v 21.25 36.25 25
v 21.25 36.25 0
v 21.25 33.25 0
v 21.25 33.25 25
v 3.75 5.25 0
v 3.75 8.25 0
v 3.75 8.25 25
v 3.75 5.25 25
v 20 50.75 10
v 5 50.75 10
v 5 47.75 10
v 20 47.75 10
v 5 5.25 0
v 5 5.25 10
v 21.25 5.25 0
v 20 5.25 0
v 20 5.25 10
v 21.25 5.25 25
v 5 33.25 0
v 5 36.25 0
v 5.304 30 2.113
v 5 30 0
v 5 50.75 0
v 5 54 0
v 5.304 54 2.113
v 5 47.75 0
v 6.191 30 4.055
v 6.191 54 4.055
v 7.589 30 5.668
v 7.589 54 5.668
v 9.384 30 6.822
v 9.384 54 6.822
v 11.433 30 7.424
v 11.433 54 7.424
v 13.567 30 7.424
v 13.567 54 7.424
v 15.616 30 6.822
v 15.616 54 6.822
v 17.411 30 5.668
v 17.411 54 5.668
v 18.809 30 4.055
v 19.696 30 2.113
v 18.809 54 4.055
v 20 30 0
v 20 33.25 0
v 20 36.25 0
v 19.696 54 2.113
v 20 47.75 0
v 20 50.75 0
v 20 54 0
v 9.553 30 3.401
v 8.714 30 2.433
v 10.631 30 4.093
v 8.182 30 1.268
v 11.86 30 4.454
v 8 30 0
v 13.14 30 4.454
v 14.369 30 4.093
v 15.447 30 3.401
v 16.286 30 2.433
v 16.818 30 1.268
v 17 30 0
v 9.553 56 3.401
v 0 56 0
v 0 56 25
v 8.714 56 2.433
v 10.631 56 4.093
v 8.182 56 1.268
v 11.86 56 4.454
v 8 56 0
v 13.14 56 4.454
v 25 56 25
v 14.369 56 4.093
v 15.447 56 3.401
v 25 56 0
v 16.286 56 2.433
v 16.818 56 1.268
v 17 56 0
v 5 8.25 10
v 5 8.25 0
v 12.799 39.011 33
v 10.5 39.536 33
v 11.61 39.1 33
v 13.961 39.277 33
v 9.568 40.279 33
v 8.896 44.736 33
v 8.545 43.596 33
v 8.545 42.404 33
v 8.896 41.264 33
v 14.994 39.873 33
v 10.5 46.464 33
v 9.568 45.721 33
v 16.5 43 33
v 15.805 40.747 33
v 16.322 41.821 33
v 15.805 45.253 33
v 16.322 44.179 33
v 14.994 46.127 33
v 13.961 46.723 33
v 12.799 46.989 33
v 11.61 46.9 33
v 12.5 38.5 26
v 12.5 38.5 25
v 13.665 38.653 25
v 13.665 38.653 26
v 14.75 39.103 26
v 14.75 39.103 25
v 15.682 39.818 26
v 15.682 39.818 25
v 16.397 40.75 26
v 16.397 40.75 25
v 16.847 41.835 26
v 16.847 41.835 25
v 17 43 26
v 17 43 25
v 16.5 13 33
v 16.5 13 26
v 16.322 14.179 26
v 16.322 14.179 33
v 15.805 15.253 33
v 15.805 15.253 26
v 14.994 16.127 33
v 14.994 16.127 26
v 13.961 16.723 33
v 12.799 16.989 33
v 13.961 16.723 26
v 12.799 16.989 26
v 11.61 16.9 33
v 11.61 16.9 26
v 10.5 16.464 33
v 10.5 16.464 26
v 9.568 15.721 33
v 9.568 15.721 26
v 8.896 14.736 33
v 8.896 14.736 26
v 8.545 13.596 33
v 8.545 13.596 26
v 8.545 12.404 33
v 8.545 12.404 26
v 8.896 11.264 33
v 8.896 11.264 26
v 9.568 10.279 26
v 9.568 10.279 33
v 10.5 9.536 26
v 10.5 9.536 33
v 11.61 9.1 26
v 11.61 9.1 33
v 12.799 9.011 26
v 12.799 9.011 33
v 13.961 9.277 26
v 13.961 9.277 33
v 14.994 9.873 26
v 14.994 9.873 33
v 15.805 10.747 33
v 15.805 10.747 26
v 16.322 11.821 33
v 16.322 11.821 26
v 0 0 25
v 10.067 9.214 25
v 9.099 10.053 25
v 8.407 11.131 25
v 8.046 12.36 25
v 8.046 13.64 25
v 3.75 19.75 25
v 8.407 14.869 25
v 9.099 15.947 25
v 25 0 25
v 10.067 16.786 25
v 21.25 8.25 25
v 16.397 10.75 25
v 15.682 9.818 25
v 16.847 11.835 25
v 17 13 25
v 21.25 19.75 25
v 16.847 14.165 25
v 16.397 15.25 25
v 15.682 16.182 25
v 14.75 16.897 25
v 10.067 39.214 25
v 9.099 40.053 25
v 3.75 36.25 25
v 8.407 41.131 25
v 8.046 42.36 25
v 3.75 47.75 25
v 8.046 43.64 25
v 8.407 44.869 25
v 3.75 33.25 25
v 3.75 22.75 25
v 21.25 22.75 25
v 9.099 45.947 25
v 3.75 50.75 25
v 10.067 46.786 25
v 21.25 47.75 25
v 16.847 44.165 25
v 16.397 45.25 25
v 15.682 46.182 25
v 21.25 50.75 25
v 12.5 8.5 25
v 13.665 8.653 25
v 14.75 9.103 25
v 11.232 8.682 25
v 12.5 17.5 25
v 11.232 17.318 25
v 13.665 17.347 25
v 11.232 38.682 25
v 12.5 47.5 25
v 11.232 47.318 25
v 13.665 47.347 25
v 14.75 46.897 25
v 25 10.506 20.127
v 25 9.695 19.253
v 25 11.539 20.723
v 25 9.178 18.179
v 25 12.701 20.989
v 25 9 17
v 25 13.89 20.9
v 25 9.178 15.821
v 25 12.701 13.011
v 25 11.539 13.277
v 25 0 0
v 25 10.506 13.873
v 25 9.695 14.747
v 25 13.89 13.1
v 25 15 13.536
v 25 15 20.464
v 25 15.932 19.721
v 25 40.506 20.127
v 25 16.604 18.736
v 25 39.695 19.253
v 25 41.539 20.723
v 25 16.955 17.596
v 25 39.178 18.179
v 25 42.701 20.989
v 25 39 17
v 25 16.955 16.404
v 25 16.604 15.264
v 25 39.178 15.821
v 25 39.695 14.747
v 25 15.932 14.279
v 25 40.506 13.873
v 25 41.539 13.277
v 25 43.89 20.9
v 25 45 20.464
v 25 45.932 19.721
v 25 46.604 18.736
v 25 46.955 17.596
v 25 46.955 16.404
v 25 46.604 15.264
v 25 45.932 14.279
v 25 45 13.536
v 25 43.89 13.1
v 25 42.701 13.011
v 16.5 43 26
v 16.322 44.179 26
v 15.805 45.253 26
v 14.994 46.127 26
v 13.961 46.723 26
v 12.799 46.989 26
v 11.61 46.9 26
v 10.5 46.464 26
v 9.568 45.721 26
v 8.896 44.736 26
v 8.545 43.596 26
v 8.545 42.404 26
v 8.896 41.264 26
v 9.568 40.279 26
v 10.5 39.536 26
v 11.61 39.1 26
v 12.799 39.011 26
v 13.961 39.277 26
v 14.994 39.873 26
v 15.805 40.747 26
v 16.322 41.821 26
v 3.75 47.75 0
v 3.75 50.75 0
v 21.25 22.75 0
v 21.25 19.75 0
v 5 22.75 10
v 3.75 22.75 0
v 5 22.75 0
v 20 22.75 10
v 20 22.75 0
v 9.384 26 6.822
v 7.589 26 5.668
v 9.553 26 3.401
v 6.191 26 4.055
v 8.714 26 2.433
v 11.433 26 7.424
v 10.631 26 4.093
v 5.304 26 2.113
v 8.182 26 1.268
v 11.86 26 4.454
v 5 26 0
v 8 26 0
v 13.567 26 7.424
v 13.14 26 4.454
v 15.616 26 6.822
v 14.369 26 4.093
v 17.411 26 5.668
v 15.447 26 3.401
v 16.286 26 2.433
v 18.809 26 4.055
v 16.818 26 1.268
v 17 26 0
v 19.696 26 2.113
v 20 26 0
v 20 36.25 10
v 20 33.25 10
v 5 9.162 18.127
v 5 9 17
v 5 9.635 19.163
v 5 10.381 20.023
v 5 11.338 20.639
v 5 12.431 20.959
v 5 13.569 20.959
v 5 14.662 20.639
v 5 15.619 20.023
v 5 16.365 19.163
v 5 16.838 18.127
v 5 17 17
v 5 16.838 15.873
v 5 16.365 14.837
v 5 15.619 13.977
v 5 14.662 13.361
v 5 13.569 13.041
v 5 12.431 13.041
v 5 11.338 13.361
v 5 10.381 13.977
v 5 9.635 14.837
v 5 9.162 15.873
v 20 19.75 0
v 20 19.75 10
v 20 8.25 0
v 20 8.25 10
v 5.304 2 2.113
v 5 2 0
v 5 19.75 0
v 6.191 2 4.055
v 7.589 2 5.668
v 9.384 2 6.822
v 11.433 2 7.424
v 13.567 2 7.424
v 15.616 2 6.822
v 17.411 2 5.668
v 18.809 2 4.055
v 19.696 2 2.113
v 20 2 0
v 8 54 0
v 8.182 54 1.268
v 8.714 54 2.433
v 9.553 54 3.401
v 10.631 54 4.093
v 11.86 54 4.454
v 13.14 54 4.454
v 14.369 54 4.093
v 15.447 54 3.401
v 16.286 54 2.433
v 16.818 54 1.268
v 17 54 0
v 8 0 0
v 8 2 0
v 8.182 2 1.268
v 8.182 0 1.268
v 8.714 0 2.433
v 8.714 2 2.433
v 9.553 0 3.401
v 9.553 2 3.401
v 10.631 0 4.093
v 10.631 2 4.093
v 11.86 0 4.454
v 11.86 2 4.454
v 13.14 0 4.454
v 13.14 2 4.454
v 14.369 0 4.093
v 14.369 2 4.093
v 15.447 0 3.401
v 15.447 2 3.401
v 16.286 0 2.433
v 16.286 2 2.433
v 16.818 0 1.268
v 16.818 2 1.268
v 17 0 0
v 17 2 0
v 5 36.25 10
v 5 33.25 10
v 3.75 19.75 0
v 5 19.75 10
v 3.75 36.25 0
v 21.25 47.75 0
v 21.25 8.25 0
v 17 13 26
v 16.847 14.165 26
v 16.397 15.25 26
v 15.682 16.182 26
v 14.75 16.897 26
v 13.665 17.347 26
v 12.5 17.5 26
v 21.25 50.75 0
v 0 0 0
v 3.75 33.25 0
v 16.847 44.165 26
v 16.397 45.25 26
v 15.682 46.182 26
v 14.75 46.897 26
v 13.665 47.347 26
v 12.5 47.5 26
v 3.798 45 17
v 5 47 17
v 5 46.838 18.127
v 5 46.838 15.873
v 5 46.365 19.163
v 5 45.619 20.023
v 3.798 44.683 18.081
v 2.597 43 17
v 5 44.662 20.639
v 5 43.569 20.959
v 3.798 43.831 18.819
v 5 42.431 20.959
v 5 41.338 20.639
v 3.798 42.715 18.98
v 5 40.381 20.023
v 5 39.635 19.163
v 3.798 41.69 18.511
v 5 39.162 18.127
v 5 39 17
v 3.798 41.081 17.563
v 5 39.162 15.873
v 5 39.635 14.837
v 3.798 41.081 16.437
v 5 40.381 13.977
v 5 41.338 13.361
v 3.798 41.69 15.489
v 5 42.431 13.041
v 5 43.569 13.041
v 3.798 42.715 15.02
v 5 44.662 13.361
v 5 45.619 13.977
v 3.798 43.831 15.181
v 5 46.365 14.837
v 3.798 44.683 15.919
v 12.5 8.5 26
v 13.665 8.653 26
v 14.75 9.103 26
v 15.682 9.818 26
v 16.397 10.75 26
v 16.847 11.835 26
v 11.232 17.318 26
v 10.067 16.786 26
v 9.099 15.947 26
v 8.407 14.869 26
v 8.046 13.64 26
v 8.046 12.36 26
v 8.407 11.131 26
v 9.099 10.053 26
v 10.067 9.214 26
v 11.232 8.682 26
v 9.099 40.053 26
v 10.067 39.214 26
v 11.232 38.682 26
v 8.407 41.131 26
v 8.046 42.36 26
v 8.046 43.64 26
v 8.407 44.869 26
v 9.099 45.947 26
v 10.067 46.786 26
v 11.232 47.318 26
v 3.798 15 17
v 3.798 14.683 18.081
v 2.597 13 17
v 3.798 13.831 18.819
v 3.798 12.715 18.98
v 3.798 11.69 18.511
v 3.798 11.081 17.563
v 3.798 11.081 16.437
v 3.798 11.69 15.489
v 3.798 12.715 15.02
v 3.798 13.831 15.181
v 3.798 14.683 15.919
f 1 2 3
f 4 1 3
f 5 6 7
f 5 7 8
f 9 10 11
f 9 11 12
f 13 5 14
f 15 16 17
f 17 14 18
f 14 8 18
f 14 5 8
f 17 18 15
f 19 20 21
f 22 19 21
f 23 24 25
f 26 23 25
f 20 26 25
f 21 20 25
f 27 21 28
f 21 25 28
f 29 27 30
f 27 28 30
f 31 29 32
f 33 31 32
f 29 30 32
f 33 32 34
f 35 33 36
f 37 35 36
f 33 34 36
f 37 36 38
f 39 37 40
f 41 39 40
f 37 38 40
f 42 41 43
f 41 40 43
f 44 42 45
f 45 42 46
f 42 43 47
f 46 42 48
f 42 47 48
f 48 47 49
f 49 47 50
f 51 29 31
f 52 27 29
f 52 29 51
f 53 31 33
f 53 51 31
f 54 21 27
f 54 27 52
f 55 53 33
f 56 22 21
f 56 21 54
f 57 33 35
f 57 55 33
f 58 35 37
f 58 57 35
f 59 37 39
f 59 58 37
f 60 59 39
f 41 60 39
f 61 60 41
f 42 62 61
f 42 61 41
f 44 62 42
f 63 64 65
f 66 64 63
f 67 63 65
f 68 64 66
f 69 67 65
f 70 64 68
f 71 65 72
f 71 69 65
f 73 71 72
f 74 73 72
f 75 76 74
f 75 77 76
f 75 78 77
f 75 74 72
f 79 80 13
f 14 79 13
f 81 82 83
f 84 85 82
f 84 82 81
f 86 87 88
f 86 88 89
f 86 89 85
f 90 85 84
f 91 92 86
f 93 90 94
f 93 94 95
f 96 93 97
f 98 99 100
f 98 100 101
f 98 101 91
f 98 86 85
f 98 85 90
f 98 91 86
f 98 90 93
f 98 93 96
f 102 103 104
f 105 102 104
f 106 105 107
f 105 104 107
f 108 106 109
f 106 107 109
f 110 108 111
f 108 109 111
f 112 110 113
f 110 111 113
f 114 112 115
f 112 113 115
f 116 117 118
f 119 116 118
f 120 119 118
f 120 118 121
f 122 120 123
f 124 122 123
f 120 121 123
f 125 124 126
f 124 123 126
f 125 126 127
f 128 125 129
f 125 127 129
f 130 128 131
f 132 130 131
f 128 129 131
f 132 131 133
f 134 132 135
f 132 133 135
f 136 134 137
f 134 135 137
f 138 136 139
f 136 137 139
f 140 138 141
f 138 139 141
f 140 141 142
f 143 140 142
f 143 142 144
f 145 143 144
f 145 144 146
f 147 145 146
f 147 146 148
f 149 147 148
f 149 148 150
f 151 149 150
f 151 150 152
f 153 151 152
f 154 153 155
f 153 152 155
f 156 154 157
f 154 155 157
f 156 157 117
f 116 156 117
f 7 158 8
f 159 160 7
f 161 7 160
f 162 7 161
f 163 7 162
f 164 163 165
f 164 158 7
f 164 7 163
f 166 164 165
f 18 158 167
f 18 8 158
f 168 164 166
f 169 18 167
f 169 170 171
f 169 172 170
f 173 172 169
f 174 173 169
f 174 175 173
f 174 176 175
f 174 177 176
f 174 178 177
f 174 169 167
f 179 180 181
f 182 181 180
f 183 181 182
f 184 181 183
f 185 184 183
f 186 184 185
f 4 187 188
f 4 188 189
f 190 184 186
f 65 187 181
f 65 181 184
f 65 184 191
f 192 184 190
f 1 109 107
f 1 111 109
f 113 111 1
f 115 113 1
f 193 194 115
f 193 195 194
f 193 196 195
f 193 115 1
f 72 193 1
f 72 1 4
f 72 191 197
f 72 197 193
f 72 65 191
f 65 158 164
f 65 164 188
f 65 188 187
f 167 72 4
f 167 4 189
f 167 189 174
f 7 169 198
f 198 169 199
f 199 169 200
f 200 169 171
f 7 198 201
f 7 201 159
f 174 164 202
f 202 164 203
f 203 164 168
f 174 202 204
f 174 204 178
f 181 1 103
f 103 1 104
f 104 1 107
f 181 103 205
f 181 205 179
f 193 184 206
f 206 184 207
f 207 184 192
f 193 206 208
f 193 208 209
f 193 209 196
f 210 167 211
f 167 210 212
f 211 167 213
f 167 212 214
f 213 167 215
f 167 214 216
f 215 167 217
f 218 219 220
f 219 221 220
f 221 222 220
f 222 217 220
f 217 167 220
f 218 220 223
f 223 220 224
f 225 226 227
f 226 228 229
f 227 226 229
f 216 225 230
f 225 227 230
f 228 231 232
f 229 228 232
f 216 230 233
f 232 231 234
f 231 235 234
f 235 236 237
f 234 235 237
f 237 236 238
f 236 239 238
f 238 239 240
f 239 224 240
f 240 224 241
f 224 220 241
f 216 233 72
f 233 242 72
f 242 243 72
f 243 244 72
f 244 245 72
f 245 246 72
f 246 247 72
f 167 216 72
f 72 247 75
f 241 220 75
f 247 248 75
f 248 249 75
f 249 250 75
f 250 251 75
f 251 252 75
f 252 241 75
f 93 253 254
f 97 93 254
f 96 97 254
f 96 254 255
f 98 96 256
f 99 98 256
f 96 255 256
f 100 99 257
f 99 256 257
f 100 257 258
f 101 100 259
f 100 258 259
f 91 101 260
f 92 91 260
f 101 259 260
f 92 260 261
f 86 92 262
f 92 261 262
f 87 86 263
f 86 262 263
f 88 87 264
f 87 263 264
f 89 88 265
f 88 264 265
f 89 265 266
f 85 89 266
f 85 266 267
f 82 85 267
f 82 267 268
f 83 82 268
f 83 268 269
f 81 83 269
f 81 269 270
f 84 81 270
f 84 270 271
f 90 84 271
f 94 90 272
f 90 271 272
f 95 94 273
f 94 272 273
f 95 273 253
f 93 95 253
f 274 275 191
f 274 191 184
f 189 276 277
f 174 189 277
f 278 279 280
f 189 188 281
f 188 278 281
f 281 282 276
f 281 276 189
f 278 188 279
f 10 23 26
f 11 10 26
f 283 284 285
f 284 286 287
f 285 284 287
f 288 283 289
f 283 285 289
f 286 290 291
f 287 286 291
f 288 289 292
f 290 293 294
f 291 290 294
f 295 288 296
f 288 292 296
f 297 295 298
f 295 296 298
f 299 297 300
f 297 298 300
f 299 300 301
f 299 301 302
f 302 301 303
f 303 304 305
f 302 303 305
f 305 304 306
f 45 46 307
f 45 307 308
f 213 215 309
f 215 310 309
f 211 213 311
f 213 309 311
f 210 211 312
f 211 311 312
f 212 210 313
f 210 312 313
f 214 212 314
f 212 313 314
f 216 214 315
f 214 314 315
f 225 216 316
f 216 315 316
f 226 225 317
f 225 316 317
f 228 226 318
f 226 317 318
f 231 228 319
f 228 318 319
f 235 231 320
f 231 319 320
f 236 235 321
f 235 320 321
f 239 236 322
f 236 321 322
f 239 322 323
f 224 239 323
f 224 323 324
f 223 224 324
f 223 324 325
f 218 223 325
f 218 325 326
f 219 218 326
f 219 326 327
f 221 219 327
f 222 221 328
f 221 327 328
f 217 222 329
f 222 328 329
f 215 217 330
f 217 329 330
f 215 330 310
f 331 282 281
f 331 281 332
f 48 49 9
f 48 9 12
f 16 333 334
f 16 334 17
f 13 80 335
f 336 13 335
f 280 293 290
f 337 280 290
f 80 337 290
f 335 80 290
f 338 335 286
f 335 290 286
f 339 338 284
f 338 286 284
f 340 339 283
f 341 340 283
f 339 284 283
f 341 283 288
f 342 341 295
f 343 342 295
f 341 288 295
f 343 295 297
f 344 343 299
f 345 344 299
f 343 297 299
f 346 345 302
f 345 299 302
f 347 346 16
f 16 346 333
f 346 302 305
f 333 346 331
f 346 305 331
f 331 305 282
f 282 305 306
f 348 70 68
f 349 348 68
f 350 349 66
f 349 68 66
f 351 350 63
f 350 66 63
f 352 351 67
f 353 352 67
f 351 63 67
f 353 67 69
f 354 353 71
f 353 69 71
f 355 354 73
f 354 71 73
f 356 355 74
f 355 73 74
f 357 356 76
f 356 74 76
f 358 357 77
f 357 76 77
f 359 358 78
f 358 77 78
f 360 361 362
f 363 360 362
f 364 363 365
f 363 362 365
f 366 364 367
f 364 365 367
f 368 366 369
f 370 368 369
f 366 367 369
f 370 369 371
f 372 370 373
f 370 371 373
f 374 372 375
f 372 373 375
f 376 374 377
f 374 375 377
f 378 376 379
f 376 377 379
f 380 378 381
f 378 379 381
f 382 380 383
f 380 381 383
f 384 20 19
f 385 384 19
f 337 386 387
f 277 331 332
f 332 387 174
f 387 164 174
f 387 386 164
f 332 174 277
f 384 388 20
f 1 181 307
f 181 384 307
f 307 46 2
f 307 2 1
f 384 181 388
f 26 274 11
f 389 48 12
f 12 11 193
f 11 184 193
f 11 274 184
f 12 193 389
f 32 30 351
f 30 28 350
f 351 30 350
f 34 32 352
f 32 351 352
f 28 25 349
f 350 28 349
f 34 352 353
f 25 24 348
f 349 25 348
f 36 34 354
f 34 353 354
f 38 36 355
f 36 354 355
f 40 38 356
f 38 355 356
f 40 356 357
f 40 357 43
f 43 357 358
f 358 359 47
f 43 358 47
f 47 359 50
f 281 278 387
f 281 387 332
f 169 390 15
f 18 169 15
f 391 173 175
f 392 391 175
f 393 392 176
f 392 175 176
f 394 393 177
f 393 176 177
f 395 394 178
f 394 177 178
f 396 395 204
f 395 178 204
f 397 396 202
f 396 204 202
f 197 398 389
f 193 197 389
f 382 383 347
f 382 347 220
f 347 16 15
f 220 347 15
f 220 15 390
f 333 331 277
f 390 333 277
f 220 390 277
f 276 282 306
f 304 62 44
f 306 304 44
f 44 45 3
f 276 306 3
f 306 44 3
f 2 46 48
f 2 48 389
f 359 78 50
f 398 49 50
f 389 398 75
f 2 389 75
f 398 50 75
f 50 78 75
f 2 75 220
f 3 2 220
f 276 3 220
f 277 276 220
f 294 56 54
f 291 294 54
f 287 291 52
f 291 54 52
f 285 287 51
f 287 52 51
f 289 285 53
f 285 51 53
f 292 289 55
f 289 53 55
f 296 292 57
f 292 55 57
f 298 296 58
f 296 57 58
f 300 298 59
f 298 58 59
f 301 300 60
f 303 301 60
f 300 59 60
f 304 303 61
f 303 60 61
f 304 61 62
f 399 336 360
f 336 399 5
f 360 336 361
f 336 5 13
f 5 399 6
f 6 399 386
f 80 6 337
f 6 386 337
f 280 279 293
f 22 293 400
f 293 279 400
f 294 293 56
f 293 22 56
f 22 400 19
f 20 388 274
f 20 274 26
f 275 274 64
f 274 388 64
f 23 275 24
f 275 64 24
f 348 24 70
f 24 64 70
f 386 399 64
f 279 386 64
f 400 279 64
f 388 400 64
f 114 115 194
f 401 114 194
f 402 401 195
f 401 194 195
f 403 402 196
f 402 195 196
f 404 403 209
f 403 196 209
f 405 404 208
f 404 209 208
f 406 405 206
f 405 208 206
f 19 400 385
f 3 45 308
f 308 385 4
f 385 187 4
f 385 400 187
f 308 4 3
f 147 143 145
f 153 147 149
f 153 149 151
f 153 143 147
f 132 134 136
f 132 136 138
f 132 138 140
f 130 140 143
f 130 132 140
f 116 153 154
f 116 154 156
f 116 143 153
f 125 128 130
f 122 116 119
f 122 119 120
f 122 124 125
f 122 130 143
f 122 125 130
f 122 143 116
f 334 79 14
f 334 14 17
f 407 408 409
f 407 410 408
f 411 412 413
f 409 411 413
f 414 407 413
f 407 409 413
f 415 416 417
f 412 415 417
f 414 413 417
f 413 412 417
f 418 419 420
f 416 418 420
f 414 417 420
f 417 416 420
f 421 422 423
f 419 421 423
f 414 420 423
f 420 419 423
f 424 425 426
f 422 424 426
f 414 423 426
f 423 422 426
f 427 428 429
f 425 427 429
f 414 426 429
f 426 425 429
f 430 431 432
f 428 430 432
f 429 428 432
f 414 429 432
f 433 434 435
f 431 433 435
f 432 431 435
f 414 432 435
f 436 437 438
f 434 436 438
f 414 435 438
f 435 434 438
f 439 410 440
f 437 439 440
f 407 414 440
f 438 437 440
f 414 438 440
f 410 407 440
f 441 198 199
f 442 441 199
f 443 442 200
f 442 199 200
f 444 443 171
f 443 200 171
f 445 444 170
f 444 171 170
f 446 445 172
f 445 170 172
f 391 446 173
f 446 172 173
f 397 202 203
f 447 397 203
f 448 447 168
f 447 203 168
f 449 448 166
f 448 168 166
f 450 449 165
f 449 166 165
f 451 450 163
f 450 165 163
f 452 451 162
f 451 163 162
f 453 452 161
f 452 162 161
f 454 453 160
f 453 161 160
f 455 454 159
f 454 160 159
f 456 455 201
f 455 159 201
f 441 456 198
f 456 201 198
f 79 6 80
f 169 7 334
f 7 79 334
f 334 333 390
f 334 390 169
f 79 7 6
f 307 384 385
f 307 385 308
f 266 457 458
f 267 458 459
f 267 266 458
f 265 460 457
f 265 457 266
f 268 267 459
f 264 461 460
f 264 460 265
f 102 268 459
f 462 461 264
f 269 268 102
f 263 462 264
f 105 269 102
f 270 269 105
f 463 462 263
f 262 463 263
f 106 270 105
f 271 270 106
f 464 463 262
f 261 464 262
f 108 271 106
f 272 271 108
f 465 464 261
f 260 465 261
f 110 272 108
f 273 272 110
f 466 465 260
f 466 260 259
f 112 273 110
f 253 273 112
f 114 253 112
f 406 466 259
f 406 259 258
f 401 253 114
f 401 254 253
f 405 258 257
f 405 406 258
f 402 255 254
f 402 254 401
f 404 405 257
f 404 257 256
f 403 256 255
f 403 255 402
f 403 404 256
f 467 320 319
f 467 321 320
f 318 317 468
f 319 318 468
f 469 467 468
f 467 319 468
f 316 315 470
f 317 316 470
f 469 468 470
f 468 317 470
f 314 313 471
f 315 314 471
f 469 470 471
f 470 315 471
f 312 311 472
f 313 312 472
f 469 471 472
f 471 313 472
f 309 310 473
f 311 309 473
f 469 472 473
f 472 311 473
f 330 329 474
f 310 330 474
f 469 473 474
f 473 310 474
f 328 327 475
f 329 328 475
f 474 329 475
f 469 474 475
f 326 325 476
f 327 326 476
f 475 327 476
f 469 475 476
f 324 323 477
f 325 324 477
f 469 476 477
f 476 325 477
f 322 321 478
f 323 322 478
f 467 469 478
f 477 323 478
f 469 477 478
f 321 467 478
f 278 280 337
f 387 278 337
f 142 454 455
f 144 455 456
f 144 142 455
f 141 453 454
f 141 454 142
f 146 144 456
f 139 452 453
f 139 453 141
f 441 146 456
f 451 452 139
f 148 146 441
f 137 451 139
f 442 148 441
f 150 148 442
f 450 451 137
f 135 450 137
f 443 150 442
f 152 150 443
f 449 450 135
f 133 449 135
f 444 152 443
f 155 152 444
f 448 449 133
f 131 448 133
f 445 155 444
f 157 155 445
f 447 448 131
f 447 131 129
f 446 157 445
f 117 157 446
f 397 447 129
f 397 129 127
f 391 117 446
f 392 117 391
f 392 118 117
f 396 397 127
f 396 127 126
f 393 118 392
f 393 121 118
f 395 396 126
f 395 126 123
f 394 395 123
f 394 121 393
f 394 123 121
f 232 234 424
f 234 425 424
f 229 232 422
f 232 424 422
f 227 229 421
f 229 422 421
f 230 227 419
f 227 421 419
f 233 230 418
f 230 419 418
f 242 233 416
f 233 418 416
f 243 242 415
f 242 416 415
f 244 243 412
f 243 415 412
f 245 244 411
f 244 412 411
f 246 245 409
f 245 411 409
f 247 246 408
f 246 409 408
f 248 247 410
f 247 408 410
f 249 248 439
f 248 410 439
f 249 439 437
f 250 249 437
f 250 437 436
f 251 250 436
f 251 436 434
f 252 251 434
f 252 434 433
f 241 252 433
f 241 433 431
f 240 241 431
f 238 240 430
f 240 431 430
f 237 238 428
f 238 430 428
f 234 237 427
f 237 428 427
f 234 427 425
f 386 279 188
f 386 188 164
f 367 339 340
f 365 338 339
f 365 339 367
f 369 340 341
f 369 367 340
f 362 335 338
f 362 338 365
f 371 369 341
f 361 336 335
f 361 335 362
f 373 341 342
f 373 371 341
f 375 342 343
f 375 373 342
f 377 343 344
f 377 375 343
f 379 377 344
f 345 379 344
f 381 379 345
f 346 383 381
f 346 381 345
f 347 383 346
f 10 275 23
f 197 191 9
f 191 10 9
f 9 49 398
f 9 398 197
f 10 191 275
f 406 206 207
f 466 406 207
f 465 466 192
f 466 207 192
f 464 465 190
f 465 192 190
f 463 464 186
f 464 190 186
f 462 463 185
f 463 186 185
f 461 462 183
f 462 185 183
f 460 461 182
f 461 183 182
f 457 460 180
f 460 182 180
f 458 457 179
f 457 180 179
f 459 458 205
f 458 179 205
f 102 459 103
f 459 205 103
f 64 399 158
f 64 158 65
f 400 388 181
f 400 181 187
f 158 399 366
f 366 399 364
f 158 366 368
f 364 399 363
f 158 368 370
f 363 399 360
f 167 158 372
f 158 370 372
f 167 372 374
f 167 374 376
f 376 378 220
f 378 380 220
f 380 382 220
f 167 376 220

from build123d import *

# Parameters (mm, degrees)
F0_W      = 25
F0_H      = 56
F1_DEPTH  = 25
F4_D      = 15
F5_D      = 8
F5_DEPTH  = 20
F5_TIP    = 2.4034424761
F7_DEPTH  = 1
F8_W      = 25
F8_H      = 2
F9_DEPTH  = 8
F10_W     = 1.25
F10_H     = 3
F11_DEPTH = 26.001
F12_W     = 17.5
F12_H     = 3
F13_DEPTH = 15
F14_R     = 4
F15_R     = 4
F16_DEPTH = 7
F18_D     = 9


with BuildPart() as f1:
    # F0 (on Top) → F1 (new body)
    with BuildSketch(Plane.XY):
        with Locations((12.5, 28)):
            Rectangle(F0_W, F0_H)
    extrude(amount=F1_DEPTH)

    # F4 (through all)
    with Locations(Plane.XZ):
        with Locations((12.5, 0)):
            Hole(F4_D / 2)

    # F5
    with Locations(Plane.YZ.offset(25)):
        with Locations((13, 17), (43, 17)):
            Hole(F5_D / 2, depth=F5_DEPTH)
            with Locations((0, 0, -(F5_DEPTH + F5_TIP / 2))):  # 118° drill point
                Cone(0, F5_D / 2, F5_TIP, mode=Mode.SUBTRACT)

    # F6 (on face) → F7 (join)
    with BuildSketch(Plane.XY.offset(25)):
        with BuildLine():
            ThreePointArc((12.5, 17.5), (8, 13), (12.5, 8.5))
            Line((12.5, 8.5), (12.5, 17.5))
        make_face()
        with BuildLine():
            ThreePointArc((12.5, 47.5), (8, 43), (12.5, 38.5))
            Line((12.5, 38.5), (12.5, 47.5))
        make_face()
        with BuildLine():
            Line((12.5, 47.5), (12.5, 38.5))
            ThreePointArc((12.5, 38.5), (15.6819805153, 39.8180194847), (17, 43))
            ThreePointArc((17, 43), (15.6819805153, 46.1819805153), (12.5, 47.5))
        make_face()
        with BuildLine():
            Line((12.5, 17.5), (12.5, 8.5))
            ThreePointArc((12.5, 8.5), (15.6819805153, 9.8180194847), (17, 13))
            ThreePointArc((17, 13), (15.6819805153, 16.1819805153), (12.5, 17.5))
        make_face()
    extrude(amount=F7_DEPTH)

    # F8 (on face) → F9 (join)
    with BuildSketch(Plane(origin=(0, 0, 0), x_dir=(1, 0, 0), z_dir=(0, 0, -1))):
        with Locations((12.5, -1)):
            Rectangle(F8_W, F8_H)
        with Locations((12.5, -27)):
            Rectangle(F8_W, F8_H)
        with Locations((12.5, -29)):
            Rectangle(F8_W, F8_H)
        with Locations((12.5, -55)):
            Rectangle(F8_W, F8_H)
    extrude(amount=-F9_DEPTH)

    # F10 (on face) → F11 (cut, through all)
    with BuildSketch(Plane(origin=(0, 0, 0), x_dir=(1, 0, 0), z_dir=(0, 0, -1))):
        with Locations((4.375, -6.75)):
            Rectangle(F10_W, F10_H)
        with Locations((20.625, -6.75)):
            Rectangle(F10_W, F10_H)
        with Locations((4.375, -21.25)):
            Rectangle(F10_W, F10_H)
        with Locations((20.625, -21.25)):
            Rectangle(F10_W, F10_H)
        with Locations((20.625, -49.25)):
            Rectangle(F10_W, F10_H)
        with Locations((4.375, -49.25)):
            Rectangle(F10_W, F10_H)
        with Locations((20.625, -34.75)):
            Rectangle(F10_W, F10_H)
        with Locations((4.375, -34.75)):
            Rectangle(F10_W, F10_H)
    extrude(amount=-F11_DEPTH, mode=Mode.SUBTRACT)

    # F12 (on face) → F13 (cut)
    with BuildSketch(Plane.XY.offset(25)):
        with Locations((12.5, 6.75)):
            Rectangle(F12_W, F12_H)
        with Locations((12.5, 21.25)):
            Rectangle(F12_W, F12_H)
        with Locations((12.5, 34.75)):
            Rectangle(F12_W, F12_H)
        with Locations((12.5, 49.25)):
            Rectangle(F12_W, F12_H)
    extrude(amount=-F13_DEPTH, mode=Mode.SUBTRACT)

    # F14 (on face) + F15 (on face) → F16 (join)
    with BuildSketch(Plane.XY.offset(26)):
        with Locations((12.5, 43)):
            Circle(F14_R)
    with BuildSketch(Plane.XY.offset(26)):
        with Locations((12.5, 13)):
            Circle(F15_R)
    extrude(amount=F16_DEPTH)

    # F18 (through all)
    with Locations(Plane.XZ):
        with Locations((12.5, 0)):
            Hole(F18_D / 2)


solid = f1.part
